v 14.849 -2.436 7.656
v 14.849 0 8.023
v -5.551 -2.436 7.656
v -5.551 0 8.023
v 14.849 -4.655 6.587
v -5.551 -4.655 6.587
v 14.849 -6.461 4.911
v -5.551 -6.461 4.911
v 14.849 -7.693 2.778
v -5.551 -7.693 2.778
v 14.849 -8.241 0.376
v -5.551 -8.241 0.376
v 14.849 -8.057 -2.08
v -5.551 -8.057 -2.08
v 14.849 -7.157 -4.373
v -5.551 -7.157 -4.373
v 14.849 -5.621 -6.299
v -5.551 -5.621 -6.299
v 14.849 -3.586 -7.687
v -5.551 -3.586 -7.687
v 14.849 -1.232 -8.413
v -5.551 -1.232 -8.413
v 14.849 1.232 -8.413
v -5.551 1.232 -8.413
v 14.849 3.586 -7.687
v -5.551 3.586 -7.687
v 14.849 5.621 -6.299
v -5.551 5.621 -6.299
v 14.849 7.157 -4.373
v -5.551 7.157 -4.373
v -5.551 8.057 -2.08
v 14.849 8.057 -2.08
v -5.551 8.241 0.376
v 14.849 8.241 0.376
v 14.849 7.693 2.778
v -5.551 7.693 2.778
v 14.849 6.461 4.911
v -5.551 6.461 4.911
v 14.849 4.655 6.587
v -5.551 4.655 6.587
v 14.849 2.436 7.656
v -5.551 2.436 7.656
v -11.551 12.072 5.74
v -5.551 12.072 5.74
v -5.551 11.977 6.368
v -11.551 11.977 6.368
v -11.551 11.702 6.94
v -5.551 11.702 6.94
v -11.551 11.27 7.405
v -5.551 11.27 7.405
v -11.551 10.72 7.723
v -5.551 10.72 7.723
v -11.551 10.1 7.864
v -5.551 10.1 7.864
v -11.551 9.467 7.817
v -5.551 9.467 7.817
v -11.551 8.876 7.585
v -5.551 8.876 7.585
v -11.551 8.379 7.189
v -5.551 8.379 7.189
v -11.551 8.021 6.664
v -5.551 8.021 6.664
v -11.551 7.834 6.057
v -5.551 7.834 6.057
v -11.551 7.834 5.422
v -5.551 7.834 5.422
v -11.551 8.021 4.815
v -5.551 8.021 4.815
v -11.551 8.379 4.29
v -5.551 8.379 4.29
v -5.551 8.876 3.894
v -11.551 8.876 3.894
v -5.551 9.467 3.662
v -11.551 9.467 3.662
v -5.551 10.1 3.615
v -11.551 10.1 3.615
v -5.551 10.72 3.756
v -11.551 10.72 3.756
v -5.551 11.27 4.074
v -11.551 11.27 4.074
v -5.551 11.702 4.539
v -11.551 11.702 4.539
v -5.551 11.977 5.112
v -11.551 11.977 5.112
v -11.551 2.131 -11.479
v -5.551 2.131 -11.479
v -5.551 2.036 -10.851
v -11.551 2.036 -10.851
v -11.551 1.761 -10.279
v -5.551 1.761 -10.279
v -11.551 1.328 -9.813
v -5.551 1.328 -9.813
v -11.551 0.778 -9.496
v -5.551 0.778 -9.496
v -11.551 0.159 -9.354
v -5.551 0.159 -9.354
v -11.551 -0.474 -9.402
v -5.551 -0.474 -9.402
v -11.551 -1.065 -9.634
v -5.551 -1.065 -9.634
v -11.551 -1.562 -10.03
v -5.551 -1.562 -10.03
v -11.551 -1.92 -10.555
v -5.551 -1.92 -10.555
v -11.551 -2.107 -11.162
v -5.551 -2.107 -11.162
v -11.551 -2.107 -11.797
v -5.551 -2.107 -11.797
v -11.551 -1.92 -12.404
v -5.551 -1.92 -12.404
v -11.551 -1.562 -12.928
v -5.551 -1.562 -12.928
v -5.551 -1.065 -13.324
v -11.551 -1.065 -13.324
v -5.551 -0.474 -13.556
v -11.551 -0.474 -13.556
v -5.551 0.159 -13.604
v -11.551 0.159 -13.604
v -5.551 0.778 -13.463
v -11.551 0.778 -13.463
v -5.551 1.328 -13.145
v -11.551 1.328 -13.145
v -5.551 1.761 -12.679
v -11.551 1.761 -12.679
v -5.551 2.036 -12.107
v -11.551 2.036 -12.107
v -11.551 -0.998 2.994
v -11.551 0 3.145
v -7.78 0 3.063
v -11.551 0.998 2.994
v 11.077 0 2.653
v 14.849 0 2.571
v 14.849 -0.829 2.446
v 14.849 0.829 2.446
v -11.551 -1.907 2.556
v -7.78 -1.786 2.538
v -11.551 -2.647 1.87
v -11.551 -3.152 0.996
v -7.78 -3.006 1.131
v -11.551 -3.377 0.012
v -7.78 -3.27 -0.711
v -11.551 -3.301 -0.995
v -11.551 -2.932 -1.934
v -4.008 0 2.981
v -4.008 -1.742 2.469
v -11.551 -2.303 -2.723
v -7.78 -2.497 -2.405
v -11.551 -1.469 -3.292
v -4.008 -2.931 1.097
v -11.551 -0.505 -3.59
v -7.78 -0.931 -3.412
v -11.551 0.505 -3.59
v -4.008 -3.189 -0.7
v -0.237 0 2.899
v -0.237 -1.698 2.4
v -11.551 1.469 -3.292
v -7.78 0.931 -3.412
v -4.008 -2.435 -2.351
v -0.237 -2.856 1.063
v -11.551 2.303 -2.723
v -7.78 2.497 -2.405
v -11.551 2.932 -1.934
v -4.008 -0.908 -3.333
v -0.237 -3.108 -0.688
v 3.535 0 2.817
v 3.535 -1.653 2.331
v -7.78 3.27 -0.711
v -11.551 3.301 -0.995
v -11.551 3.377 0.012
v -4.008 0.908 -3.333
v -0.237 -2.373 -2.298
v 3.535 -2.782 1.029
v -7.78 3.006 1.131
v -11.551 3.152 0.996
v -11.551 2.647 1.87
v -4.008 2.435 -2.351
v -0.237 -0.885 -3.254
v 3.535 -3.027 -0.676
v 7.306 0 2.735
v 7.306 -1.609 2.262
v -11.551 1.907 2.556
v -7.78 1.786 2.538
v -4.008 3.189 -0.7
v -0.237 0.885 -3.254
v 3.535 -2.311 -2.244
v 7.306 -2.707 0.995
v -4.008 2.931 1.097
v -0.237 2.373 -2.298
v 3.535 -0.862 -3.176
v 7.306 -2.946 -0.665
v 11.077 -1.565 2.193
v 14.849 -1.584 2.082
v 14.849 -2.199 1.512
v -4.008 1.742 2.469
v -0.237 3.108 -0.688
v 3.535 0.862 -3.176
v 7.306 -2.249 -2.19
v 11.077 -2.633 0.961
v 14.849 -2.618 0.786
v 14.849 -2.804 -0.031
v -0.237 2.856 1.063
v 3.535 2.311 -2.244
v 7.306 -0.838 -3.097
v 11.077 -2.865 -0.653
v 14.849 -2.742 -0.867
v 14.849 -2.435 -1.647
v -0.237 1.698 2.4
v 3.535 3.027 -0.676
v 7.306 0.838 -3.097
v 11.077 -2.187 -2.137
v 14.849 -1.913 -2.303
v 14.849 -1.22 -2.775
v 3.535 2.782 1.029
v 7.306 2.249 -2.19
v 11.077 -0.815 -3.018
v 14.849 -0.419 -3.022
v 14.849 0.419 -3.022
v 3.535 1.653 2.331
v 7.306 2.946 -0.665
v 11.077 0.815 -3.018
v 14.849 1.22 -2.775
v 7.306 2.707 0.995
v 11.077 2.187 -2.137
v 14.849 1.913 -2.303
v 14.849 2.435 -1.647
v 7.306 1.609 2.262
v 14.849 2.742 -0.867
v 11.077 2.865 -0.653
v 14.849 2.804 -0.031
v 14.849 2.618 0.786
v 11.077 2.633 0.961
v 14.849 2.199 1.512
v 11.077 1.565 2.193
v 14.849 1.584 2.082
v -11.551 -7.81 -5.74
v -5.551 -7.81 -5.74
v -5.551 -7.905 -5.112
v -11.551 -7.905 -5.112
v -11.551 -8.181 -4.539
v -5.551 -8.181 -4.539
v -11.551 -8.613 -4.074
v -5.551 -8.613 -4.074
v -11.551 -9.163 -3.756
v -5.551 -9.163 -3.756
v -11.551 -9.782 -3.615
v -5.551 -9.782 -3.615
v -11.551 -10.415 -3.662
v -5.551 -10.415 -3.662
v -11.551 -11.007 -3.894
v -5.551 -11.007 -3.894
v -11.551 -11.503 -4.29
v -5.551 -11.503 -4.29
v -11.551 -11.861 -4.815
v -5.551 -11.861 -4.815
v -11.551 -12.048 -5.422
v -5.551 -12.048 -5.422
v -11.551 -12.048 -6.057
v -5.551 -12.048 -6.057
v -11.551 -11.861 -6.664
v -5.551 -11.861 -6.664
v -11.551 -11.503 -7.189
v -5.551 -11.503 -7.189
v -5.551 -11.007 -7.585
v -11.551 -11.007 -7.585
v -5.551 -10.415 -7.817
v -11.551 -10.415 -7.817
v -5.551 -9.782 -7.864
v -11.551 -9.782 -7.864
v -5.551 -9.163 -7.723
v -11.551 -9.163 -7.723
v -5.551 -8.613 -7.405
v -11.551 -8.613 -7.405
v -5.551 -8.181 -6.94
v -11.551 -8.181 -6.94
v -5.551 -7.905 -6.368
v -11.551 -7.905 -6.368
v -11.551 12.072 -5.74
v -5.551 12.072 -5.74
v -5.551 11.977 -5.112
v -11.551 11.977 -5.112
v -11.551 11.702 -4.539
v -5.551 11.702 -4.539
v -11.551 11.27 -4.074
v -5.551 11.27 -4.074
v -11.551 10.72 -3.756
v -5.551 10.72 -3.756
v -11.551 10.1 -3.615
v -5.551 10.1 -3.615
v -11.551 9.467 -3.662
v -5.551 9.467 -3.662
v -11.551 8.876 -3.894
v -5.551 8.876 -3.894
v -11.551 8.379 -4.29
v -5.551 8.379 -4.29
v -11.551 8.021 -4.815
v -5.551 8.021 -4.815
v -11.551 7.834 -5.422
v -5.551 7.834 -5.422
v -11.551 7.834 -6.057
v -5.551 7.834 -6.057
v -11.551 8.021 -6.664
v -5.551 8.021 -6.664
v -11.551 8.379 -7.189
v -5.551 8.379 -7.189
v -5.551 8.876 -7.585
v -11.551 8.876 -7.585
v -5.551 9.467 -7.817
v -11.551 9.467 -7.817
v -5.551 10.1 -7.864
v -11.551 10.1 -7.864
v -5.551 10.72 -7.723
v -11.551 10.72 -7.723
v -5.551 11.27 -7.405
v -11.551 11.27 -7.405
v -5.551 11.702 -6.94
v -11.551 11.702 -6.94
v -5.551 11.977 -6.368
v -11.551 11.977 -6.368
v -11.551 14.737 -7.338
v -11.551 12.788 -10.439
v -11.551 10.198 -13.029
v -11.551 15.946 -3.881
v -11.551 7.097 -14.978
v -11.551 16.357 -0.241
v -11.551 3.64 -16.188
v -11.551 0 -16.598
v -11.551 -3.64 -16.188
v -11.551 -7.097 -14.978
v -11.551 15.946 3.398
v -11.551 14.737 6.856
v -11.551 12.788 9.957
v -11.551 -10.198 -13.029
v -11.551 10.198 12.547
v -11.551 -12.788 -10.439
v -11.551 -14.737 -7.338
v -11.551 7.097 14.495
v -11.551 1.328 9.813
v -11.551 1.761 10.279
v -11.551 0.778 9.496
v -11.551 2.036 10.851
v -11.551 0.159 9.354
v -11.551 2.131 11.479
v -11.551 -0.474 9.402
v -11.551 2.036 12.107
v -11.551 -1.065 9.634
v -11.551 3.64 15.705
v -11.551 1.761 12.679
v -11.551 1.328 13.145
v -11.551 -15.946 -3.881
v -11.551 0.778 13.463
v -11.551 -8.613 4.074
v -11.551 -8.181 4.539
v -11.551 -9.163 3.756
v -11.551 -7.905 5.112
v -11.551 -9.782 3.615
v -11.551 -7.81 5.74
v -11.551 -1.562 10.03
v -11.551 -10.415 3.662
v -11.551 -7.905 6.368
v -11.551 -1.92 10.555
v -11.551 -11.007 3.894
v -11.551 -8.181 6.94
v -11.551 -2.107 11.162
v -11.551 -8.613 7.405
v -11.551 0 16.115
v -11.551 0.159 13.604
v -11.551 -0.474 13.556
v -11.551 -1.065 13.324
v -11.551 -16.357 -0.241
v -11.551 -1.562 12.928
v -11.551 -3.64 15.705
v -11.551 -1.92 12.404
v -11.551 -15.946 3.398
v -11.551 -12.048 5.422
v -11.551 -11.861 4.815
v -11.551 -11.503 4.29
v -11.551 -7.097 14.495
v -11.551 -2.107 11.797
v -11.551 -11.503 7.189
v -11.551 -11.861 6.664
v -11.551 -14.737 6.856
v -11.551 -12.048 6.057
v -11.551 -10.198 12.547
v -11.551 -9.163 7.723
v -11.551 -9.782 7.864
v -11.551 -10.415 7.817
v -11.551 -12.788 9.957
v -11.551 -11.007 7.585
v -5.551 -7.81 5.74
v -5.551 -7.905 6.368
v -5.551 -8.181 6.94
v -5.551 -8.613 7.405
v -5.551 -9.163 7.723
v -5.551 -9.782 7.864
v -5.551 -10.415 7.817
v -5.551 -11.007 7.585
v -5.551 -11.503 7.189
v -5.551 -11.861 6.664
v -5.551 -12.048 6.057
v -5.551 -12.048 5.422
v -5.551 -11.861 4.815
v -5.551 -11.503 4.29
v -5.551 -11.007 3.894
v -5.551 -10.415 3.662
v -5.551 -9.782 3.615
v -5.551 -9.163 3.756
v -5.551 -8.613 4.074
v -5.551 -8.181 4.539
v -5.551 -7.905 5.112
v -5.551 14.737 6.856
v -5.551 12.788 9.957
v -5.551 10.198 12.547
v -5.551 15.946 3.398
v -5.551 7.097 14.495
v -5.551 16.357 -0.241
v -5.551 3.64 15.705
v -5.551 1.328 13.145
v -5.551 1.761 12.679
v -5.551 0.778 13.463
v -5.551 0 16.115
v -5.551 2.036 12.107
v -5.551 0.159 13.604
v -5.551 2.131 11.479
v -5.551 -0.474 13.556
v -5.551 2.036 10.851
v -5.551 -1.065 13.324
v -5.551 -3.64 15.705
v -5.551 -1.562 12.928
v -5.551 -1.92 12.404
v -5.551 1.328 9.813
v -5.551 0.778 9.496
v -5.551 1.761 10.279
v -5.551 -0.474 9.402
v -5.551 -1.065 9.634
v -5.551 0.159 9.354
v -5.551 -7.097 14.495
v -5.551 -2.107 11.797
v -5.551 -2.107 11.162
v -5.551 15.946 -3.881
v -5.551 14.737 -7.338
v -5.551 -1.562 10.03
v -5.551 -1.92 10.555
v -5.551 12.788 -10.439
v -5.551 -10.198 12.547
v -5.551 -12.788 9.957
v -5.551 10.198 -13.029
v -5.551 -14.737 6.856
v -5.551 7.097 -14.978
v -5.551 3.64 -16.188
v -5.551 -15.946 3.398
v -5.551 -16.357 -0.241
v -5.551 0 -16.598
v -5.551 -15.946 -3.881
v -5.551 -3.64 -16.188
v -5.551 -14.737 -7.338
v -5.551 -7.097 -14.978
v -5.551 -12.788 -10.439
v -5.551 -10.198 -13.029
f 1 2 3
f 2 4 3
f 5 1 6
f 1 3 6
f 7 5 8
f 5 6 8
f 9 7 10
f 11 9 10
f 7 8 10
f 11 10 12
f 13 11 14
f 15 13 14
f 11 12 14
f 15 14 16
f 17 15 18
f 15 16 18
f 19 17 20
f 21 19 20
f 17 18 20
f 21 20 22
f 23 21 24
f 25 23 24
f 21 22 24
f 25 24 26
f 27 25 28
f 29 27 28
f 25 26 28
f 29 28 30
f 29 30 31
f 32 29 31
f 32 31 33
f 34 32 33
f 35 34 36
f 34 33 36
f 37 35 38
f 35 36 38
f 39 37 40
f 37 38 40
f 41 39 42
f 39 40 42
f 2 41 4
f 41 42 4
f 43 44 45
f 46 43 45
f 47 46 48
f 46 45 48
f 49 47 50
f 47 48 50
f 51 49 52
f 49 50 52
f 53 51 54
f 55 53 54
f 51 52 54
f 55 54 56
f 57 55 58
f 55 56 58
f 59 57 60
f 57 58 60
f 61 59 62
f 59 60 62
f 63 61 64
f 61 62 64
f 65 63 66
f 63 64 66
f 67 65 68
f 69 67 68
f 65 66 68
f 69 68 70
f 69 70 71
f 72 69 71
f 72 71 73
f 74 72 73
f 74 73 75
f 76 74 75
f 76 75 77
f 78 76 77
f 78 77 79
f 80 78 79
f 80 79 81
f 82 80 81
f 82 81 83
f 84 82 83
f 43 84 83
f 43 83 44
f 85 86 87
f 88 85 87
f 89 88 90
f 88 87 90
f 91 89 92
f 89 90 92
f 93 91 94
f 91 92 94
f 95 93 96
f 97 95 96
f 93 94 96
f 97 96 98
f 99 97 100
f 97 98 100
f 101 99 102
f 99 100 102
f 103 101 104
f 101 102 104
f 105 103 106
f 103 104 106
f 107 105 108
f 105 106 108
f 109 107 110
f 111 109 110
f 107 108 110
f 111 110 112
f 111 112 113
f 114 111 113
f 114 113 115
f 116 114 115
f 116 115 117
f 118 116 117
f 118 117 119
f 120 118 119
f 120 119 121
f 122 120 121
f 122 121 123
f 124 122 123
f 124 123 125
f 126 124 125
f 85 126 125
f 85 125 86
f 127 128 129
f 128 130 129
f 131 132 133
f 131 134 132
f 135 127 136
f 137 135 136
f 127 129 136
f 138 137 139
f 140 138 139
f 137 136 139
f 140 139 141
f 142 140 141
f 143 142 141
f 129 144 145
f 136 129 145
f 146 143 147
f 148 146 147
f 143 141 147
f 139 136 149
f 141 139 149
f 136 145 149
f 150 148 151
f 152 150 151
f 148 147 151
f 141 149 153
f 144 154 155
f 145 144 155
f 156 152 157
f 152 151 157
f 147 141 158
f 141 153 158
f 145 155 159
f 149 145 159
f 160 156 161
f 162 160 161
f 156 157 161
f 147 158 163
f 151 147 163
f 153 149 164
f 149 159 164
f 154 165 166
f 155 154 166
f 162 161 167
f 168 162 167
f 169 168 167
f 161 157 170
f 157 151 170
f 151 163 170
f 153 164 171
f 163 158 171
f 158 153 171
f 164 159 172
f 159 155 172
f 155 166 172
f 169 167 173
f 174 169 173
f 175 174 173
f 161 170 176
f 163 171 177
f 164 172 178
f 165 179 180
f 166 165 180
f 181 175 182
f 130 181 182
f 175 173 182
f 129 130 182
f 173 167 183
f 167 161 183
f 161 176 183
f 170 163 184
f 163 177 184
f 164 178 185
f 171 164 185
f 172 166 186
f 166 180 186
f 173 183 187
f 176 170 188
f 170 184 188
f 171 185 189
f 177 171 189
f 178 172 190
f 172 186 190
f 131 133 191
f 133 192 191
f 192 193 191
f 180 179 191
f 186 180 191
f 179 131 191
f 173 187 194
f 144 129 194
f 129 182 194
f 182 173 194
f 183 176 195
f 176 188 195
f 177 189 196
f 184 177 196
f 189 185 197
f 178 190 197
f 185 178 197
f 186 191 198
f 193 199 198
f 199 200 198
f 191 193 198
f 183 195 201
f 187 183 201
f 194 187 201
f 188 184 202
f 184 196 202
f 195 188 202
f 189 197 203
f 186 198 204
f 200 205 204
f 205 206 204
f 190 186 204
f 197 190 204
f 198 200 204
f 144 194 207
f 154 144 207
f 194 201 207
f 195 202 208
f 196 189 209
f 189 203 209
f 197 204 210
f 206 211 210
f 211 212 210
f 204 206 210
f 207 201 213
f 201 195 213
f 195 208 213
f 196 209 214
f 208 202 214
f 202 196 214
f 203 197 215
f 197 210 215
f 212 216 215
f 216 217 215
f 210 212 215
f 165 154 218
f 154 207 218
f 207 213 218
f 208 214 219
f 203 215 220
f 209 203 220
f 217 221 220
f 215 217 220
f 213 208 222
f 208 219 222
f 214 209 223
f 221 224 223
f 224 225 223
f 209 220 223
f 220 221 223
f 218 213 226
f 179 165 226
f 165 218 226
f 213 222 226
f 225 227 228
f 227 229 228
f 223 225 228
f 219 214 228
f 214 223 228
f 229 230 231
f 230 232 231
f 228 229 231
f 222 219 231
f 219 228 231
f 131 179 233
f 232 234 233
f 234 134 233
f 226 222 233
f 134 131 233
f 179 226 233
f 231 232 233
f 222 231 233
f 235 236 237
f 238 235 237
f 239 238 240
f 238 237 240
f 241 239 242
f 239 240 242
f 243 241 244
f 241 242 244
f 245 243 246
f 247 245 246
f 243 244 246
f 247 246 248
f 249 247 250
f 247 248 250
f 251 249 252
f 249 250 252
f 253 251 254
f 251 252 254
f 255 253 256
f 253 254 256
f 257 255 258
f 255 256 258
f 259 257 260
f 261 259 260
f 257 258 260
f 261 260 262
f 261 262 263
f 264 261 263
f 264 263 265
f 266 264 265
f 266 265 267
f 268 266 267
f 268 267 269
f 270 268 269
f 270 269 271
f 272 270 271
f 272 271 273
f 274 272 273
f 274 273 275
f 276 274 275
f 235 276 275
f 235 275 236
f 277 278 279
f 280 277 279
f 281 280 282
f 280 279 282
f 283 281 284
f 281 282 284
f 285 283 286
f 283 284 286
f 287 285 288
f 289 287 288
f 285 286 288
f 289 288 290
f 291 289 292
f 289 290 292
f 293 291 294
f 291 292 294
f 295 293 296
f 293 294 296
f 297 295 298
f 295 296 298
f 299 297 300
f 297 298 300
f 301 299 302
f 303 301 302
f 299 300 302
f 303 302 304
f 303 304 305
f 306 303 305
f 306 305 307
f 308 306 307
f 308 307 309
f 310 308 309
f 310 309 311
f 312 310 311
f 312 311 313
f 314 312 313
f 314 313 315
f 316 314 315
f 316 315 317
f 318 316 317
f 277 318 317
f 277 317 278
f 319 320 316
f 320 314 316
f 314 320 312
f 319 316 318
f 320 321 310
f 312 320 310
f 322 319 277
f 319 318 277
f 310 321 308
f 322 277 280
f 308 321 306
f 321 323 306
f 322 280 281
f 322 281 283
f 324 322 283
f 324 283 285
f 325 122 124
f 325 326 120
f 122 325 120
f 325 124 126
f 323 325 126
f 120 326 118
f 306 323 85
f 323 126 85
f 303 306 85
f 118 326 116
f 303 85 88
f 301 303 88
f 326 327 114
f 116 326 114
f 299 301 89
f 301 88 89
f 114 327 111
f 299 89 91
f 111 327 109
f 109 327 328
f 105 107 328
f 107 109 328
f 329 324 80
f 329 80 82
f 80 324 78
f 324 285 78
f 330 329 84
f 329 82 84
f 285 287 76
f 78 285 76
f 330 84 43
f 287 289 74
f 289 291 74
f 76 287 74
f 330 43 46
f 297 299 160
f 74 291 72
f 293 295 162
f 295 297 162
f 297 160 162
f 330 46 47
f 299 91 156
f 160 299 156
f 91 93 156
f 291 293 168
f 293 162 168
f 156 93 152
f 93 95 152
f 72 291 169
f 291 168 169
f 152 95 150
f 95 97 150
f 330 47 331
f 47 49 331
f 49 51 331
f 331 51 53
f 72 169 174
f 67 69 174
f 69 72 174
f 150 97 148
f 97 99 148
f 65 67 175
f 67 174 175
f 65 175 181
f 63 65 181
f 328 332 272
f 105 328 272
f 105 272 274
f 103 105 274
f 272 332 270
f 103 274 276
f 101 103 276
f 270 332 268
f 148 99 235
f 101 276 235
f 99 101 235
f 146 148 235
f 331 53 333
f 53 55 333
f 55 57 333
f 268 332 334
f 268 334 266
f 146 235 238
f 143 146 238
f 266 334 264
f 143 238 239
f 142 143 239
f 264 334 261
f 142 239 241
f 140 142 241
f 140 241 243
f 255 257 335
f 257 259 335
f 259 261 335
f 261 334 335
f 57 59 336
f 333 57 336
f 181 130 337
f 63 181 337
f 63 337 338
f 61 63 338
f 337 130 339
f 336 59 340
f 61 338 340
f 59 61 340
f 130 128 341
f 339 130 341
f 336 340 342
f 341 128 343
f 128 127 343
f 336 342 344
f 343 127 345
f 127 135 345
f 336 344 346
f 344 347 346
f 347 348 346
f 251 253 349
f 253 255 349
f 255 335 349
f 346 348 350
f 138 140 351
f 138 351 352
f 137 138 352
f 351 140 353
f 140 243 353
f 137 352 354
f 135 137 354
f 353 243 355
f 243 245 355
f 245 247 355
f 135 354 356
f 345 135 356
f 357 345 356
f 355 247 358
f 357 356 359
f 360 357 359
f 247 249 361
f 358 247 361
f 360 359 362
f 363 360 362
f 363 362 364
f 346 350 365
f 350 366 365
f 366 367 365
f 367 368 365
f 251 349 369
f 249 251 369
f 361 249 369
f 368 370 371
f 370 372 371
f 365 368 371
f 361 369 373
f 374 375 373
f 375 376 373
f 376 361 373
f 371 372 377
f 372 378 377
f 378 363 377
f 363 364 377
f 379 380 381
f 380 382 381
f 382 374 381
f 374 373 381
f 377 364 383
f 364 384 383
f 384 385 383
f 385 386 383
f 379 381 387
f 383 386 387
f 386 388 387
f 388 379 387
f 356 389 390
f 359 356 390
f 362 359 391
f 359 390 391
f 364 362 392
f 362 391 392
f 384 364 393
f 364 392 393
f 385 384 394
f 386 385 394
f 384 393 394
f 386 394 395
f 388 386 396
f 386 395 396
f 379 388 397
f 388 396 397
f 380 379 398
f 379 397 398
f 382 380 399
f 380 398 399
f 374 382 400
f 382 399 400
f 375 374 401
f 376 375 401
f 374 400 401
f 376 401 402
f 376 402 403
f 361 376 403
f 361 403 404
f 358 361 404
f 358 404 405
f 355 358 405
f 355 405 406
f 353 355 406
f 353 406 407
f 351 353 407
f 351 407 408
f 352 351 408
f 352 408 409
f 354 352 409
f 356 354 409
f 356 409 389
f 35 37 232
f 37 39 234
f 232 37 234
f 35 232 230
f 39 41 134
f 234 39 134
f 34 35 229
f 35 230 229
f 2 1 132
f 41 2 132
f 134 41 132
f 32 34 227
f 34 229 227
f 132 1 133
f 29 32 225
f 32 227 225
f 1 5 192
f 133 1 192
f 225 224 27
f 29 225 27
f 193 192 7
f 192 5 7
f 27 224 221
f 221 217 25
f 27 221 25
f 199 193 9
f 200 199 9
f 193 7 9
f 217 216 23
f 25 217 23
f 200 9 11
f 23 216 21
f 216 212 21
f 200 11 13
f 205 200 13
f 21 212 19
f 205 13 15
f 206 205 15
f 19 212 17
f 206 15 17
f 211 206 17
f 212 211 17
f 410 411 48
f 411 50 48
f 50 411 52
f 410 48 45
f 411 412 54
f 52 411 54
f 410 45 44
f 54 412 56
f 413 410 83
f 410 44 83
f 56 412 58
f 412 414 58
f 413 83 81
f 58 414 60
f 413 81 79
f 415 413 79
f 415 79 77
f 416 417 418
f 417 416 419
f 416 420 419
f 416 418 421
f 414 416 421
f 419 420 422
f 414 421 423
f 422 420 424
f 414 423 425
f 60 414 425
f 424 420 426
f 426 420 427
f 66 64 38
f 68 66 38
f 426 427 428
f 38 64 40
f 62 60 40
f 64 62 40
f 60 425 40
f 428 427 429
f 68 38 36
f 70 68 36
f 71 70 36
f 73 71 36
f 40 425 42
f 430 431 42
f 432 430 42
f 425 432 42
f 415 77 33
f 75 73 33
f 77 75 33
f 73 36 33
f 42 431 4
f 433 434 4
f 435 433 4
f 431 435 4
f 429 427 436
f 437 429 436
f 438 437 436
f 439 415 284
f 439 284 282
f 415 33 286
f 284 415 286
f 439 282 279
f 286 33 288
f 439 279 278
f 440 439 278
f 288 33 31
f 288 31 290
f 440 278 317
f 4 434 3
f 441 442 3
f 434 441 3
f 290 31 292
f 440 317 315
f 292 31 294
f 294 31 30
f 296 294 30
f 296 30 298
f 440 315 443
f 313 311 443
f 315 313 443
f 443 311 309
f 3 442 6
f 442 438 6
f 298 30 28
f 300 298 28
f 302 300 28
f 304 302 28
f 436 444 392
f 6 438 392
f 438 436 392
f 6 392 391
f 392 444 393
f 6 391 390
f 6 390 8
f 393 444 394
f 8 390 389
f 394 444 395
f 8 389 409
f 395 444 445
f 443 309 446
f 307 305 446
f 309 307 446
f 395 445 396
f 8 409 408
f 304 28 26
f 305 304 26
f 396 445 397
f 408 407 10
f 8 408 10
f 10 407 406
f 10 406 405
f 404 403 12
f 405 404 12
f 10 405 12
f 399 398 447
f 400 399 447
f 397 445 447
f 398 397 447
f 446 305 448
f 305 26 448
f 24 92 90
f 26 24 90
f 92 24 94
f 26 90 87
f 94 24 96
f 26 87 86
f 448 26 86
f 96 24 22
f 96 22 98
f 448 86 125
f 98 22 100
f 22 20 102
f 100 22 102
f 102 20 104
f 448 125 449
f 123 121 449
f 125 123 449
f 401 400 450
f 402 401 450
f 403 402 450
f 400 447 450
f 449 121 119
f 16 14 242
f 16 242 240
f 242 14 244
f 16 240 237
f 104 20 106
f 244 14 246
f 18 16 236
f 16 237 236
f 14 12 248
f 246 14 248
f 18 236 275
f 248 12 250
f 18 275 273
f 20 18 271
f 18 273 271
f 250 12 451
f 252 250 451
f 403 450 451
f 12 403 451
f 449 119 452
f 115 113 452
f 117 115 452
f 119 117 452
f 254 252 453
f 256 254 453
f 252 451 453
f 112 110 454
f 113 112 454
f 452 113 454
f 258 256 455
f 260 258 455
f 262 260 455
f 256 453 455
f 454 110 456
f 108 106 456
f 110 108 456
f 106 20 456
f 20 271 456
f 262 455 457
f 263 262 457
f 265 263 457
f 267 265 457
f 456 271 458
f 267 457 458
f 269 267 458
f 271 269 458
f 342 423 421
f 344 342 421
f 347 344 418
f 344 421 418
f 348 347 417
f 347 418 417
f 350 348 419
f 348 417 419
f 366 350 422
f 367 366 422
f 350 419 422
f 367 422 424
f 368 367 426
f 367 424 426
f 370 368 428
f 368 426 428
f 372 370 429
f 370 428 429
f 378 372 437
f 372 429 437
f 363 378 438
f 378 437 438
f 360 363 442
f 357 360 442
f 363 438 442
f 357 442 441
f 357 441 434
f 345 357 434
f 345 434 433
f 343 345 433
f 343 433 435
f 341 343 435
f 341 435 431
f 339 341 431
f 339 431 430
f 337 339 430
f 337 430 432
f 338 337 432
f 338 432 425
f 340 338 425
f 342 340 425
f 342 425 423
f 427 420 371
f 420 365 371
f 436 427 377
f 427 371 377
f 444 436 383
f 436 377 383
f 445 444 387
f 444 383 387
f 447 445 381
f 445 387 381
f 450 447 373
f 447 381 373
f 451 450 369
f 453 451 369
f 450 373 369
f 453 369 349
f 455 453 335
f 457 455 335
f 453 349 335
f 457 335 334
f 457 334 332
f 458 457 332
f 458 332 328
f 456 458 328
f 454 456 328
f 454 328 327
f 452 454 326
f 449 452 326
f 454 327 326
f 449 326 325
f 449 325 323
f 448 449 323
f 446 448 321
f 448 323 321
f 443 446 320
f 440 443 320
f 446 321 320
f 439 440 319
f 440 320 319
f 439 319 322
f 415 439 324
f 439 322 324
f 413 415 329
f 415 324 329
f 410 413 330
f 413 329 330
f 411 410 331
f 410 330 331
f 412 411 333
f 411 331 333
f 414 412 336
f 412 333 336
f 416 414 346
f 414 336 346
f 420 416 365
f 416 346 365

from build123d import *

# Parameters (mm, degrees)
F2_R     = 2.130745
F3_DEPTH = 6.001


with BuildPart() as f1:
    # F0 (on Front) → F1 (revolve)
    with BuildSketch(Plane.XZ):
        Polygon((-5.551115, 16.115252), (-11.551115, 16.115252), (-11.551115, 3.144817), (14.848885, 2.570904), (14.848885, 8.023078), (-5.551115, 8.023078), align=None)
    revolve(axis=Axis((0.128016, 0, -0.24127), (1, 0, 0)))

    # F2 (on face) → F3 (cut, through all)
    with BuildSketch(Plane.YZ.offset(-5.551115)):
        with Locations((-9.941192, 5.73955)):
            Circle(F2_R)
        with Locations((-9.941192, -5.73955)):
            Circle(F2_R)
        with Locations((0, -11.479099)):
            Circle(F2_R)
        with Locations((9.941192, -5.73955)):
            Circle(F2_R)
        with Locations((9.941192, 5.73955)):
            Circle(F2_R)
        with Locations((0, 11.479099)):
            Circle(F2_R)
    extrude(amount=-F3_DEPTH, mode=Mode.SUBTRACT)


solid = f1.part
